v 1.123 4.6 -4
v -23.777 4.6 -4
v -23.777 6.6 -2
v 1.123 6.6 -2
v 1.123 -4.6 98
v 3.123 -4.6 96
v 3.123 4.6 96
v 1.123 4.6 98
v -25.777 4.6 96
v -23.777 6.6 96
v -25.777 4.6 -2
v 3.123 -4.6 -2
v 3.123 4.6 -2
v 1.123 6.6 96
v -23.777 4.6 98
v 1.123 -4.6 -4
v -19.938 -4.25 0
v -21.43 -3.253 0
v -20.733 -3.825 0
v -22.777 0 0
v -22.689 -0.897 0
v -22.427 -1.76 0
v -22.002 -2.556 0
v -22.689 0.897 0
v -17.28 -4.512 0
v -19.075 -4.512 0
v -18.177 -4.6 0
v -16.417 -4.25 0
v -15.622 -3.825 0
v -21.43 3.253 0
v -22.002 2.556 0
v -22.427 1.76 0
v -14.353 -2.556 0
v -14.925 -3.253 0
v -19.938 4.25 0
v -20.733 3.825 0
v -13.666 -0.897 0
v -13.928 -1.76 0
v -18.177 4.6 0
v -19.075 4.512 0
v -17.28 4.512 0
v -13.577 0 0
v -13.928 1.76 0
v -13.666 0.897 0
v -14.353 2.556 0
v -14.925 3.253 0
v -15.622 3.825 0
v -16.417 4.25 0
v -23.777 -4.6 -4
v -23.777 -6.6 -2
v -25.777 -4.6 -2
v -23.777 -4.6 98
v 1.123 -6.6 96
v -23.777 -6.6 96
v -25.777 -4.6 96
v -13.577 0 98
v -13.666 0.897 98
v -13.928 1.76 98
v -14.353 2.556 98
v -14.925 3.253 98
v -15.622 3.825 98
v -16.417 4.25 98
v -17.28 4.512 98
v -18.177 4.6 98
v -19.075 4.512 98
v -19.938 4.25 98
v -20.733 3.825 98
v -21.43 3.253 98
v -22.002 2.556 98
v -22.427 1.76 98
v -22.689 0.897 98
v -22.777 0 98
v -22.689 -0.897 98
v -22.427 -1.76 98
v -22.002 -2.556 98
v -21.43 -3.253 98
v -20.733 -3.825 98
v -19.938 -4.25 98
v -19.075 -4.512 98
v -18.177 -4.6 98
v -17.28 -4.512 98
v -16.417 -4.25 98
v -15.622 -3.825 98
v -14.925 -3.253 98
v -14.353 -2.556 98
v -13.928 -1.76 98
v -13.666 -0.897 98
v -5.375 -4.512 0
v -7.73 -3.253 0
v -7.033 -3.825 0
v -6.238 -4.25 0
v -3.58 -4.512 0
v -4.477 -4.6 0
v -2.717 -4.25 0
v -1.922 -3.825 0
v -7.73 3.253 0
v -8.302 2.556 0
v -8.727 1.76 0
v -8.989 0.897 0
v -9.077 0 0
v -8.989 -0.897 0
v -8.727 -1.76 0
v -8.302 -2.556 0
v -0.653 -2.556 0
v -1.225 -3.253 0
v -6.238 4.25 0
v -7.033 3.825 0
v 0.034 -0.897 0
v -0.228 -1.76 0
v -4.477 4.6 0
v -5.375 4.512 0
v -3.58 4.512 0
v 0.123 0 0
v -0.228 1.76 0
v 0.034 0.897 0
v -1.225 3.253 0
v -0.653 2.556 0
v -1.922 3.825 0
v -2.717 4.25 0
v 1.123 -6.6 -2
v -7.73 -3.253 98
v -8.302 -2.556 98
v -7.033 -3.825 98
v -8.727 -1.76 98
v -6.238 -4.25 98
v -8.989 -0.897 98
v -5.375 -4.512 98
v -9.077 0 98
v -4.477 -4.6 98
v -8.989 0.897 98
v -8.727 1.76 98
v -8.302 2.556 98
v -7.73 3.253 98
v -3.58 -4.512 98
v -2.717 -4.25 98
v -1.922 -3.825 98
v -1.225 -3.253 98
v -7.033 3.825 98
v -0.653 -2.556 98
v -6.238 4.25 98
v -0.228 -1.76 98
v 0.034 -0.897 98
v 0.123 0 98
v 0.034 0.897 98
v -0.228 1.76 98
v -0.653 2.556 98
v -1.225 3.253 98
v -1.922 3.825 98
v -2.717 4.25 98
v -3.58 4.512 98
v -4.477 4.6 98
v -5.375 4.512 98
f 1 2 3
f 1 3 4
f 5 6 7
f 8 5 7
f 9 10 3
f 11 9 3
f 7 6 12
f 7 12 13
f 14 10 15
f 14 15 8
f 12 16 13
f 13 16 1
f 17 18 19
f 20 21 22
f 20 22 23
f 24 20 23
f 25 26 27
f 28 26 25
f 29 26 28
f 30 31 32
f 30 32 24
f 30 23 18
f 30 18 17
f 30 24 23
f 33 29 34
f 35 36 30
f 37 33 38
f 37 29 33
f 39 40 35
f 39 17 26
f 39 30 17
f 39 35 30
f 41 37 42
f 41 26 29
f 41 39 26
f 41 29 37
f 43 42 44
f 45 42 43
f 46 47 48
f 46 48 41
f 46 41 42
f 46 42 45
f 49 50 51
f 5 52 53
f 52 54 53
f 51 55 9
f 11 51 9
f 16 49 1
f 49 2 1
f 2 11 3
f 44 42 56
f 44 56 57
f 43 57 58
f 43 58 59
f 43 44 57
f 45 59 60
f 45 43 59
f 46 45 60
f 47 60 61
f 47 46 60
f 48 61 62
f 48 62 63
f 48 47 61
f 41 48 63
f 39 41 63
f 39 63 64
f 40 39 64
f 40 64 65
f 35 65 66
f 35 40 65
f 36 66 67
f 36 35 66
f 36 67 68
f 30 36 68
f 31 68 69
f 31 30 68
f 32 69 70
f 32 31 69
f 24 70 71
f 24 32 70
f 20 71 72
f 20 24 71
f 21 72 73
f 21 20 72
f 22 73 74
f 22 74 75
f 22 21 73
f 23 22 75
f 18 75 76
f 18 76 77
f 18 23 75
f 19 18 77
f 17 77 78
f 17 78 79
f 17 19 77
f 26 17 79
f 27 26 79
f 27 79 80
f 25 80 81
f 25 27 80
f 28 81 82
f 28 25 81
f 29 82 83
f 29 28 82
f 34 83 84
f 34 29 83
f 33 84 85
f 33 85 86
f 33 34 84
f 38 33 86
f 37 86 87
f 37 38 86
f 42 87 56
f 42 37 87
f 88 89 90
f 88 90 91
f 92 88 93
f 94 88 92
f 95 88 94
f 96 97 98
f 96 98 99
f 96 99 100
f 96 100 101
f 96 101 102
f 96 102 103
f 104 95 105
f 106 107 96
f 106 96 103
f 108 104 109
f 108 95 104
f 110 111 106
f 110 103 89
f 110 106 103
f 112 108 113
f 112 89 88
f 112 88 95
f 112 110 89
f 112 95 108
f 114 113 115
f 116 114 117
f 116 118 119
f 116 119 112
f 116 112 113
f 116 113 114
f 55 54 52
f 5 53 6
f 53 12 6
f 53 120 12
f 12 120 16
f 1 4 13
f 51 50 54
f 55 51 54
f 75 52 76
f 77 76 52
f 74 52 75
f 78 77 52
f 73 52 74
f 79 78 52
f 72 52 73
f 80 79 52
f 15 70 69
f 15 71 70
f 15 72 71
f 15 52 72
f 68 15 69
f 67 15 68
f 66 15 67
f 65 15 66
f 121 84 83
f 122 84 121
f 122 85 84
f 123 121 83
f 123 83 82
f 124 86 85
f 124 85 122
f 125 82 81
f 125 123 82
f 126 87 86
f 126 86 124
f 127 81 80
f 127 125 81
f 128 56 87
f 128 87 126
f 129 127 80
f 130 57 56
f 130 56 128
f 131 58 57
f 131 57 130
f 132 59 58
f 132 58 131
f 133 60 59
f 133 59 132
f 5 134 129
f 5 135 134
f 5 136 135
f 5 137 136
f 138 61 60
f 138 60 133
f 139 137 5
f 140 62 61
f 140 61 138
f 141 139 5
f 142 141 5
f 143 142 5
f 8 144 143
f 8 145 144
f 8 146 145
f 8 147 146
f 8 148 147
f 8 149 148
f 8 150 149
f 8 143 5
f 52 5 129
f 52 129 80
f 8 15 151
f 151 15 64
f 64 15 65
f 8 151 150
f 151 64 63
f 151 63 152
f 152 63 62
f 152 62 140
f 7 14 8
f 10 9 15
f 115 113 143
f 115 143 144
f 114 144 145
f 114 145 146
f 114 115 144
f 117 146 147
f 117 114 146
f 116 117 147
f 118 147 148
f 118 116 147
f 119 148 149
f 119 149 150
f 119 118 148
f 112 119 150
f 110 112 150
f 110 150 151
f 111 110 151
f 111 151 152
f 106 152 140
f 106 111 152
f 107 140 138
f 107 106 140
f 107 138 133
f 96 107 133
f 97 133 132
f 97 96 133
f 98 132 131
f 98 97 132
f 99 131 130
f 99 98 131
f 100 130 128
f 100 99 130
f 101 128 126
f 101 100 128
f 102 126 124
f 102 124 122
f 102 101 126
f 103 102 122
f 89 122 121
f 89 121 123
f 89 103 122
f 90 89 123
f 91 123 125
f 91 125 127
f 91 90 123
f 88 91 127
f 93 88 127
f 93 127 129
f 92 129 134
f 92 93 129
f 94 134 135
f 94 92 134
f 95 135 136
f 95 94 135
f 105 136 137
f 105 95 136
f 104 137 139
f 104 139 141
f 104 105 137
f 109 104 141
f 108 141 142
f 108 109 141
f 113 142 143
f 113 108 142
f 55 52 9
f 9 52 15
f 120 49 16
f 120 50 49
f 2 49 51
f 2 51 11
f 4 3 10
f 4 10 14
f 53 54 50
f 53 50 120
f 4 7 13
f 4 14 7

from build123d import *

# Parameters (mm, degrees)
F0_W     = 28.9
F0_H     = 13.2
F0_R     = 4.6
F1_DEPTH = 98
F2_DEPTH = 4
F3_SIZE  = 1.99999


# Not quite as in the source:
# - a fillet or chamfer is up to 0.001 mm smaller than in the source, because OpenCascade refuses the exact size


with BuildPart() as f1:
    # F0 (on Top) → F1 (new body)
    with BuildSketch(Plane.XY):
        with Locations((-11.3274157623, 0)):
            Rectangle(F0_W, F0_H)
        with Locations((-18.1774157623, 0)):
            Circle(F0_R, mode=Mode.SUBTRACT)
        with Locations((-4.4774157623, 0)):
            Circle(F0_R, mode=Mode.SUBTRACT)
    extrude(amount=F1_DEPTH)

    # F0 (on Top) → F2 (join)
    with BuildSketch(Plane.XY):
        with Locations((-11.3274157623, 0)):
            Rectangle(F0_W, F0_H)
        with Locations((-18.1774157623, 0)):
            Circle(F0_R, mode=Mode.SUBTRACT)
        with Locations((-4.4774157623, 0)):
            Circle(F0_R, mode=Mode.SUBTRACT)
        with Locations((-4.4774157623, 0)):
            Circle(F0_R)
        with Locations((-18.1774157623, 0)):
            Circle(F0_R)
    extrude(amount=-F2_DEPTH)

    # F3 (size 2 in the source; OpenCascade refuses exactly that, so slightly less here)
    f3_edges = [f1.edges().sort_by_distance(p)[0] for p in [
        (-11.327416, -6.6, 98),
        (3.122584, -6.6, 47),
        (-11.327416, -6.6, -4),
        (-25.777416, -6.6, 47),
        (-25.777416, 0, 98),
        (-25.777416, 0, -4),
        (-25.777416, 6.6, 47),
        (3.122584, 6.6, 47),
        (-11.327416, 6.6, 98),
        (-11.327416, 6.6, -4),
        (3.122584, 0, 98),
        (3.122584, 0, -4),
    ]]
    chamfer(f3_edges, length=F3_SIZE)


solid = f1.part
